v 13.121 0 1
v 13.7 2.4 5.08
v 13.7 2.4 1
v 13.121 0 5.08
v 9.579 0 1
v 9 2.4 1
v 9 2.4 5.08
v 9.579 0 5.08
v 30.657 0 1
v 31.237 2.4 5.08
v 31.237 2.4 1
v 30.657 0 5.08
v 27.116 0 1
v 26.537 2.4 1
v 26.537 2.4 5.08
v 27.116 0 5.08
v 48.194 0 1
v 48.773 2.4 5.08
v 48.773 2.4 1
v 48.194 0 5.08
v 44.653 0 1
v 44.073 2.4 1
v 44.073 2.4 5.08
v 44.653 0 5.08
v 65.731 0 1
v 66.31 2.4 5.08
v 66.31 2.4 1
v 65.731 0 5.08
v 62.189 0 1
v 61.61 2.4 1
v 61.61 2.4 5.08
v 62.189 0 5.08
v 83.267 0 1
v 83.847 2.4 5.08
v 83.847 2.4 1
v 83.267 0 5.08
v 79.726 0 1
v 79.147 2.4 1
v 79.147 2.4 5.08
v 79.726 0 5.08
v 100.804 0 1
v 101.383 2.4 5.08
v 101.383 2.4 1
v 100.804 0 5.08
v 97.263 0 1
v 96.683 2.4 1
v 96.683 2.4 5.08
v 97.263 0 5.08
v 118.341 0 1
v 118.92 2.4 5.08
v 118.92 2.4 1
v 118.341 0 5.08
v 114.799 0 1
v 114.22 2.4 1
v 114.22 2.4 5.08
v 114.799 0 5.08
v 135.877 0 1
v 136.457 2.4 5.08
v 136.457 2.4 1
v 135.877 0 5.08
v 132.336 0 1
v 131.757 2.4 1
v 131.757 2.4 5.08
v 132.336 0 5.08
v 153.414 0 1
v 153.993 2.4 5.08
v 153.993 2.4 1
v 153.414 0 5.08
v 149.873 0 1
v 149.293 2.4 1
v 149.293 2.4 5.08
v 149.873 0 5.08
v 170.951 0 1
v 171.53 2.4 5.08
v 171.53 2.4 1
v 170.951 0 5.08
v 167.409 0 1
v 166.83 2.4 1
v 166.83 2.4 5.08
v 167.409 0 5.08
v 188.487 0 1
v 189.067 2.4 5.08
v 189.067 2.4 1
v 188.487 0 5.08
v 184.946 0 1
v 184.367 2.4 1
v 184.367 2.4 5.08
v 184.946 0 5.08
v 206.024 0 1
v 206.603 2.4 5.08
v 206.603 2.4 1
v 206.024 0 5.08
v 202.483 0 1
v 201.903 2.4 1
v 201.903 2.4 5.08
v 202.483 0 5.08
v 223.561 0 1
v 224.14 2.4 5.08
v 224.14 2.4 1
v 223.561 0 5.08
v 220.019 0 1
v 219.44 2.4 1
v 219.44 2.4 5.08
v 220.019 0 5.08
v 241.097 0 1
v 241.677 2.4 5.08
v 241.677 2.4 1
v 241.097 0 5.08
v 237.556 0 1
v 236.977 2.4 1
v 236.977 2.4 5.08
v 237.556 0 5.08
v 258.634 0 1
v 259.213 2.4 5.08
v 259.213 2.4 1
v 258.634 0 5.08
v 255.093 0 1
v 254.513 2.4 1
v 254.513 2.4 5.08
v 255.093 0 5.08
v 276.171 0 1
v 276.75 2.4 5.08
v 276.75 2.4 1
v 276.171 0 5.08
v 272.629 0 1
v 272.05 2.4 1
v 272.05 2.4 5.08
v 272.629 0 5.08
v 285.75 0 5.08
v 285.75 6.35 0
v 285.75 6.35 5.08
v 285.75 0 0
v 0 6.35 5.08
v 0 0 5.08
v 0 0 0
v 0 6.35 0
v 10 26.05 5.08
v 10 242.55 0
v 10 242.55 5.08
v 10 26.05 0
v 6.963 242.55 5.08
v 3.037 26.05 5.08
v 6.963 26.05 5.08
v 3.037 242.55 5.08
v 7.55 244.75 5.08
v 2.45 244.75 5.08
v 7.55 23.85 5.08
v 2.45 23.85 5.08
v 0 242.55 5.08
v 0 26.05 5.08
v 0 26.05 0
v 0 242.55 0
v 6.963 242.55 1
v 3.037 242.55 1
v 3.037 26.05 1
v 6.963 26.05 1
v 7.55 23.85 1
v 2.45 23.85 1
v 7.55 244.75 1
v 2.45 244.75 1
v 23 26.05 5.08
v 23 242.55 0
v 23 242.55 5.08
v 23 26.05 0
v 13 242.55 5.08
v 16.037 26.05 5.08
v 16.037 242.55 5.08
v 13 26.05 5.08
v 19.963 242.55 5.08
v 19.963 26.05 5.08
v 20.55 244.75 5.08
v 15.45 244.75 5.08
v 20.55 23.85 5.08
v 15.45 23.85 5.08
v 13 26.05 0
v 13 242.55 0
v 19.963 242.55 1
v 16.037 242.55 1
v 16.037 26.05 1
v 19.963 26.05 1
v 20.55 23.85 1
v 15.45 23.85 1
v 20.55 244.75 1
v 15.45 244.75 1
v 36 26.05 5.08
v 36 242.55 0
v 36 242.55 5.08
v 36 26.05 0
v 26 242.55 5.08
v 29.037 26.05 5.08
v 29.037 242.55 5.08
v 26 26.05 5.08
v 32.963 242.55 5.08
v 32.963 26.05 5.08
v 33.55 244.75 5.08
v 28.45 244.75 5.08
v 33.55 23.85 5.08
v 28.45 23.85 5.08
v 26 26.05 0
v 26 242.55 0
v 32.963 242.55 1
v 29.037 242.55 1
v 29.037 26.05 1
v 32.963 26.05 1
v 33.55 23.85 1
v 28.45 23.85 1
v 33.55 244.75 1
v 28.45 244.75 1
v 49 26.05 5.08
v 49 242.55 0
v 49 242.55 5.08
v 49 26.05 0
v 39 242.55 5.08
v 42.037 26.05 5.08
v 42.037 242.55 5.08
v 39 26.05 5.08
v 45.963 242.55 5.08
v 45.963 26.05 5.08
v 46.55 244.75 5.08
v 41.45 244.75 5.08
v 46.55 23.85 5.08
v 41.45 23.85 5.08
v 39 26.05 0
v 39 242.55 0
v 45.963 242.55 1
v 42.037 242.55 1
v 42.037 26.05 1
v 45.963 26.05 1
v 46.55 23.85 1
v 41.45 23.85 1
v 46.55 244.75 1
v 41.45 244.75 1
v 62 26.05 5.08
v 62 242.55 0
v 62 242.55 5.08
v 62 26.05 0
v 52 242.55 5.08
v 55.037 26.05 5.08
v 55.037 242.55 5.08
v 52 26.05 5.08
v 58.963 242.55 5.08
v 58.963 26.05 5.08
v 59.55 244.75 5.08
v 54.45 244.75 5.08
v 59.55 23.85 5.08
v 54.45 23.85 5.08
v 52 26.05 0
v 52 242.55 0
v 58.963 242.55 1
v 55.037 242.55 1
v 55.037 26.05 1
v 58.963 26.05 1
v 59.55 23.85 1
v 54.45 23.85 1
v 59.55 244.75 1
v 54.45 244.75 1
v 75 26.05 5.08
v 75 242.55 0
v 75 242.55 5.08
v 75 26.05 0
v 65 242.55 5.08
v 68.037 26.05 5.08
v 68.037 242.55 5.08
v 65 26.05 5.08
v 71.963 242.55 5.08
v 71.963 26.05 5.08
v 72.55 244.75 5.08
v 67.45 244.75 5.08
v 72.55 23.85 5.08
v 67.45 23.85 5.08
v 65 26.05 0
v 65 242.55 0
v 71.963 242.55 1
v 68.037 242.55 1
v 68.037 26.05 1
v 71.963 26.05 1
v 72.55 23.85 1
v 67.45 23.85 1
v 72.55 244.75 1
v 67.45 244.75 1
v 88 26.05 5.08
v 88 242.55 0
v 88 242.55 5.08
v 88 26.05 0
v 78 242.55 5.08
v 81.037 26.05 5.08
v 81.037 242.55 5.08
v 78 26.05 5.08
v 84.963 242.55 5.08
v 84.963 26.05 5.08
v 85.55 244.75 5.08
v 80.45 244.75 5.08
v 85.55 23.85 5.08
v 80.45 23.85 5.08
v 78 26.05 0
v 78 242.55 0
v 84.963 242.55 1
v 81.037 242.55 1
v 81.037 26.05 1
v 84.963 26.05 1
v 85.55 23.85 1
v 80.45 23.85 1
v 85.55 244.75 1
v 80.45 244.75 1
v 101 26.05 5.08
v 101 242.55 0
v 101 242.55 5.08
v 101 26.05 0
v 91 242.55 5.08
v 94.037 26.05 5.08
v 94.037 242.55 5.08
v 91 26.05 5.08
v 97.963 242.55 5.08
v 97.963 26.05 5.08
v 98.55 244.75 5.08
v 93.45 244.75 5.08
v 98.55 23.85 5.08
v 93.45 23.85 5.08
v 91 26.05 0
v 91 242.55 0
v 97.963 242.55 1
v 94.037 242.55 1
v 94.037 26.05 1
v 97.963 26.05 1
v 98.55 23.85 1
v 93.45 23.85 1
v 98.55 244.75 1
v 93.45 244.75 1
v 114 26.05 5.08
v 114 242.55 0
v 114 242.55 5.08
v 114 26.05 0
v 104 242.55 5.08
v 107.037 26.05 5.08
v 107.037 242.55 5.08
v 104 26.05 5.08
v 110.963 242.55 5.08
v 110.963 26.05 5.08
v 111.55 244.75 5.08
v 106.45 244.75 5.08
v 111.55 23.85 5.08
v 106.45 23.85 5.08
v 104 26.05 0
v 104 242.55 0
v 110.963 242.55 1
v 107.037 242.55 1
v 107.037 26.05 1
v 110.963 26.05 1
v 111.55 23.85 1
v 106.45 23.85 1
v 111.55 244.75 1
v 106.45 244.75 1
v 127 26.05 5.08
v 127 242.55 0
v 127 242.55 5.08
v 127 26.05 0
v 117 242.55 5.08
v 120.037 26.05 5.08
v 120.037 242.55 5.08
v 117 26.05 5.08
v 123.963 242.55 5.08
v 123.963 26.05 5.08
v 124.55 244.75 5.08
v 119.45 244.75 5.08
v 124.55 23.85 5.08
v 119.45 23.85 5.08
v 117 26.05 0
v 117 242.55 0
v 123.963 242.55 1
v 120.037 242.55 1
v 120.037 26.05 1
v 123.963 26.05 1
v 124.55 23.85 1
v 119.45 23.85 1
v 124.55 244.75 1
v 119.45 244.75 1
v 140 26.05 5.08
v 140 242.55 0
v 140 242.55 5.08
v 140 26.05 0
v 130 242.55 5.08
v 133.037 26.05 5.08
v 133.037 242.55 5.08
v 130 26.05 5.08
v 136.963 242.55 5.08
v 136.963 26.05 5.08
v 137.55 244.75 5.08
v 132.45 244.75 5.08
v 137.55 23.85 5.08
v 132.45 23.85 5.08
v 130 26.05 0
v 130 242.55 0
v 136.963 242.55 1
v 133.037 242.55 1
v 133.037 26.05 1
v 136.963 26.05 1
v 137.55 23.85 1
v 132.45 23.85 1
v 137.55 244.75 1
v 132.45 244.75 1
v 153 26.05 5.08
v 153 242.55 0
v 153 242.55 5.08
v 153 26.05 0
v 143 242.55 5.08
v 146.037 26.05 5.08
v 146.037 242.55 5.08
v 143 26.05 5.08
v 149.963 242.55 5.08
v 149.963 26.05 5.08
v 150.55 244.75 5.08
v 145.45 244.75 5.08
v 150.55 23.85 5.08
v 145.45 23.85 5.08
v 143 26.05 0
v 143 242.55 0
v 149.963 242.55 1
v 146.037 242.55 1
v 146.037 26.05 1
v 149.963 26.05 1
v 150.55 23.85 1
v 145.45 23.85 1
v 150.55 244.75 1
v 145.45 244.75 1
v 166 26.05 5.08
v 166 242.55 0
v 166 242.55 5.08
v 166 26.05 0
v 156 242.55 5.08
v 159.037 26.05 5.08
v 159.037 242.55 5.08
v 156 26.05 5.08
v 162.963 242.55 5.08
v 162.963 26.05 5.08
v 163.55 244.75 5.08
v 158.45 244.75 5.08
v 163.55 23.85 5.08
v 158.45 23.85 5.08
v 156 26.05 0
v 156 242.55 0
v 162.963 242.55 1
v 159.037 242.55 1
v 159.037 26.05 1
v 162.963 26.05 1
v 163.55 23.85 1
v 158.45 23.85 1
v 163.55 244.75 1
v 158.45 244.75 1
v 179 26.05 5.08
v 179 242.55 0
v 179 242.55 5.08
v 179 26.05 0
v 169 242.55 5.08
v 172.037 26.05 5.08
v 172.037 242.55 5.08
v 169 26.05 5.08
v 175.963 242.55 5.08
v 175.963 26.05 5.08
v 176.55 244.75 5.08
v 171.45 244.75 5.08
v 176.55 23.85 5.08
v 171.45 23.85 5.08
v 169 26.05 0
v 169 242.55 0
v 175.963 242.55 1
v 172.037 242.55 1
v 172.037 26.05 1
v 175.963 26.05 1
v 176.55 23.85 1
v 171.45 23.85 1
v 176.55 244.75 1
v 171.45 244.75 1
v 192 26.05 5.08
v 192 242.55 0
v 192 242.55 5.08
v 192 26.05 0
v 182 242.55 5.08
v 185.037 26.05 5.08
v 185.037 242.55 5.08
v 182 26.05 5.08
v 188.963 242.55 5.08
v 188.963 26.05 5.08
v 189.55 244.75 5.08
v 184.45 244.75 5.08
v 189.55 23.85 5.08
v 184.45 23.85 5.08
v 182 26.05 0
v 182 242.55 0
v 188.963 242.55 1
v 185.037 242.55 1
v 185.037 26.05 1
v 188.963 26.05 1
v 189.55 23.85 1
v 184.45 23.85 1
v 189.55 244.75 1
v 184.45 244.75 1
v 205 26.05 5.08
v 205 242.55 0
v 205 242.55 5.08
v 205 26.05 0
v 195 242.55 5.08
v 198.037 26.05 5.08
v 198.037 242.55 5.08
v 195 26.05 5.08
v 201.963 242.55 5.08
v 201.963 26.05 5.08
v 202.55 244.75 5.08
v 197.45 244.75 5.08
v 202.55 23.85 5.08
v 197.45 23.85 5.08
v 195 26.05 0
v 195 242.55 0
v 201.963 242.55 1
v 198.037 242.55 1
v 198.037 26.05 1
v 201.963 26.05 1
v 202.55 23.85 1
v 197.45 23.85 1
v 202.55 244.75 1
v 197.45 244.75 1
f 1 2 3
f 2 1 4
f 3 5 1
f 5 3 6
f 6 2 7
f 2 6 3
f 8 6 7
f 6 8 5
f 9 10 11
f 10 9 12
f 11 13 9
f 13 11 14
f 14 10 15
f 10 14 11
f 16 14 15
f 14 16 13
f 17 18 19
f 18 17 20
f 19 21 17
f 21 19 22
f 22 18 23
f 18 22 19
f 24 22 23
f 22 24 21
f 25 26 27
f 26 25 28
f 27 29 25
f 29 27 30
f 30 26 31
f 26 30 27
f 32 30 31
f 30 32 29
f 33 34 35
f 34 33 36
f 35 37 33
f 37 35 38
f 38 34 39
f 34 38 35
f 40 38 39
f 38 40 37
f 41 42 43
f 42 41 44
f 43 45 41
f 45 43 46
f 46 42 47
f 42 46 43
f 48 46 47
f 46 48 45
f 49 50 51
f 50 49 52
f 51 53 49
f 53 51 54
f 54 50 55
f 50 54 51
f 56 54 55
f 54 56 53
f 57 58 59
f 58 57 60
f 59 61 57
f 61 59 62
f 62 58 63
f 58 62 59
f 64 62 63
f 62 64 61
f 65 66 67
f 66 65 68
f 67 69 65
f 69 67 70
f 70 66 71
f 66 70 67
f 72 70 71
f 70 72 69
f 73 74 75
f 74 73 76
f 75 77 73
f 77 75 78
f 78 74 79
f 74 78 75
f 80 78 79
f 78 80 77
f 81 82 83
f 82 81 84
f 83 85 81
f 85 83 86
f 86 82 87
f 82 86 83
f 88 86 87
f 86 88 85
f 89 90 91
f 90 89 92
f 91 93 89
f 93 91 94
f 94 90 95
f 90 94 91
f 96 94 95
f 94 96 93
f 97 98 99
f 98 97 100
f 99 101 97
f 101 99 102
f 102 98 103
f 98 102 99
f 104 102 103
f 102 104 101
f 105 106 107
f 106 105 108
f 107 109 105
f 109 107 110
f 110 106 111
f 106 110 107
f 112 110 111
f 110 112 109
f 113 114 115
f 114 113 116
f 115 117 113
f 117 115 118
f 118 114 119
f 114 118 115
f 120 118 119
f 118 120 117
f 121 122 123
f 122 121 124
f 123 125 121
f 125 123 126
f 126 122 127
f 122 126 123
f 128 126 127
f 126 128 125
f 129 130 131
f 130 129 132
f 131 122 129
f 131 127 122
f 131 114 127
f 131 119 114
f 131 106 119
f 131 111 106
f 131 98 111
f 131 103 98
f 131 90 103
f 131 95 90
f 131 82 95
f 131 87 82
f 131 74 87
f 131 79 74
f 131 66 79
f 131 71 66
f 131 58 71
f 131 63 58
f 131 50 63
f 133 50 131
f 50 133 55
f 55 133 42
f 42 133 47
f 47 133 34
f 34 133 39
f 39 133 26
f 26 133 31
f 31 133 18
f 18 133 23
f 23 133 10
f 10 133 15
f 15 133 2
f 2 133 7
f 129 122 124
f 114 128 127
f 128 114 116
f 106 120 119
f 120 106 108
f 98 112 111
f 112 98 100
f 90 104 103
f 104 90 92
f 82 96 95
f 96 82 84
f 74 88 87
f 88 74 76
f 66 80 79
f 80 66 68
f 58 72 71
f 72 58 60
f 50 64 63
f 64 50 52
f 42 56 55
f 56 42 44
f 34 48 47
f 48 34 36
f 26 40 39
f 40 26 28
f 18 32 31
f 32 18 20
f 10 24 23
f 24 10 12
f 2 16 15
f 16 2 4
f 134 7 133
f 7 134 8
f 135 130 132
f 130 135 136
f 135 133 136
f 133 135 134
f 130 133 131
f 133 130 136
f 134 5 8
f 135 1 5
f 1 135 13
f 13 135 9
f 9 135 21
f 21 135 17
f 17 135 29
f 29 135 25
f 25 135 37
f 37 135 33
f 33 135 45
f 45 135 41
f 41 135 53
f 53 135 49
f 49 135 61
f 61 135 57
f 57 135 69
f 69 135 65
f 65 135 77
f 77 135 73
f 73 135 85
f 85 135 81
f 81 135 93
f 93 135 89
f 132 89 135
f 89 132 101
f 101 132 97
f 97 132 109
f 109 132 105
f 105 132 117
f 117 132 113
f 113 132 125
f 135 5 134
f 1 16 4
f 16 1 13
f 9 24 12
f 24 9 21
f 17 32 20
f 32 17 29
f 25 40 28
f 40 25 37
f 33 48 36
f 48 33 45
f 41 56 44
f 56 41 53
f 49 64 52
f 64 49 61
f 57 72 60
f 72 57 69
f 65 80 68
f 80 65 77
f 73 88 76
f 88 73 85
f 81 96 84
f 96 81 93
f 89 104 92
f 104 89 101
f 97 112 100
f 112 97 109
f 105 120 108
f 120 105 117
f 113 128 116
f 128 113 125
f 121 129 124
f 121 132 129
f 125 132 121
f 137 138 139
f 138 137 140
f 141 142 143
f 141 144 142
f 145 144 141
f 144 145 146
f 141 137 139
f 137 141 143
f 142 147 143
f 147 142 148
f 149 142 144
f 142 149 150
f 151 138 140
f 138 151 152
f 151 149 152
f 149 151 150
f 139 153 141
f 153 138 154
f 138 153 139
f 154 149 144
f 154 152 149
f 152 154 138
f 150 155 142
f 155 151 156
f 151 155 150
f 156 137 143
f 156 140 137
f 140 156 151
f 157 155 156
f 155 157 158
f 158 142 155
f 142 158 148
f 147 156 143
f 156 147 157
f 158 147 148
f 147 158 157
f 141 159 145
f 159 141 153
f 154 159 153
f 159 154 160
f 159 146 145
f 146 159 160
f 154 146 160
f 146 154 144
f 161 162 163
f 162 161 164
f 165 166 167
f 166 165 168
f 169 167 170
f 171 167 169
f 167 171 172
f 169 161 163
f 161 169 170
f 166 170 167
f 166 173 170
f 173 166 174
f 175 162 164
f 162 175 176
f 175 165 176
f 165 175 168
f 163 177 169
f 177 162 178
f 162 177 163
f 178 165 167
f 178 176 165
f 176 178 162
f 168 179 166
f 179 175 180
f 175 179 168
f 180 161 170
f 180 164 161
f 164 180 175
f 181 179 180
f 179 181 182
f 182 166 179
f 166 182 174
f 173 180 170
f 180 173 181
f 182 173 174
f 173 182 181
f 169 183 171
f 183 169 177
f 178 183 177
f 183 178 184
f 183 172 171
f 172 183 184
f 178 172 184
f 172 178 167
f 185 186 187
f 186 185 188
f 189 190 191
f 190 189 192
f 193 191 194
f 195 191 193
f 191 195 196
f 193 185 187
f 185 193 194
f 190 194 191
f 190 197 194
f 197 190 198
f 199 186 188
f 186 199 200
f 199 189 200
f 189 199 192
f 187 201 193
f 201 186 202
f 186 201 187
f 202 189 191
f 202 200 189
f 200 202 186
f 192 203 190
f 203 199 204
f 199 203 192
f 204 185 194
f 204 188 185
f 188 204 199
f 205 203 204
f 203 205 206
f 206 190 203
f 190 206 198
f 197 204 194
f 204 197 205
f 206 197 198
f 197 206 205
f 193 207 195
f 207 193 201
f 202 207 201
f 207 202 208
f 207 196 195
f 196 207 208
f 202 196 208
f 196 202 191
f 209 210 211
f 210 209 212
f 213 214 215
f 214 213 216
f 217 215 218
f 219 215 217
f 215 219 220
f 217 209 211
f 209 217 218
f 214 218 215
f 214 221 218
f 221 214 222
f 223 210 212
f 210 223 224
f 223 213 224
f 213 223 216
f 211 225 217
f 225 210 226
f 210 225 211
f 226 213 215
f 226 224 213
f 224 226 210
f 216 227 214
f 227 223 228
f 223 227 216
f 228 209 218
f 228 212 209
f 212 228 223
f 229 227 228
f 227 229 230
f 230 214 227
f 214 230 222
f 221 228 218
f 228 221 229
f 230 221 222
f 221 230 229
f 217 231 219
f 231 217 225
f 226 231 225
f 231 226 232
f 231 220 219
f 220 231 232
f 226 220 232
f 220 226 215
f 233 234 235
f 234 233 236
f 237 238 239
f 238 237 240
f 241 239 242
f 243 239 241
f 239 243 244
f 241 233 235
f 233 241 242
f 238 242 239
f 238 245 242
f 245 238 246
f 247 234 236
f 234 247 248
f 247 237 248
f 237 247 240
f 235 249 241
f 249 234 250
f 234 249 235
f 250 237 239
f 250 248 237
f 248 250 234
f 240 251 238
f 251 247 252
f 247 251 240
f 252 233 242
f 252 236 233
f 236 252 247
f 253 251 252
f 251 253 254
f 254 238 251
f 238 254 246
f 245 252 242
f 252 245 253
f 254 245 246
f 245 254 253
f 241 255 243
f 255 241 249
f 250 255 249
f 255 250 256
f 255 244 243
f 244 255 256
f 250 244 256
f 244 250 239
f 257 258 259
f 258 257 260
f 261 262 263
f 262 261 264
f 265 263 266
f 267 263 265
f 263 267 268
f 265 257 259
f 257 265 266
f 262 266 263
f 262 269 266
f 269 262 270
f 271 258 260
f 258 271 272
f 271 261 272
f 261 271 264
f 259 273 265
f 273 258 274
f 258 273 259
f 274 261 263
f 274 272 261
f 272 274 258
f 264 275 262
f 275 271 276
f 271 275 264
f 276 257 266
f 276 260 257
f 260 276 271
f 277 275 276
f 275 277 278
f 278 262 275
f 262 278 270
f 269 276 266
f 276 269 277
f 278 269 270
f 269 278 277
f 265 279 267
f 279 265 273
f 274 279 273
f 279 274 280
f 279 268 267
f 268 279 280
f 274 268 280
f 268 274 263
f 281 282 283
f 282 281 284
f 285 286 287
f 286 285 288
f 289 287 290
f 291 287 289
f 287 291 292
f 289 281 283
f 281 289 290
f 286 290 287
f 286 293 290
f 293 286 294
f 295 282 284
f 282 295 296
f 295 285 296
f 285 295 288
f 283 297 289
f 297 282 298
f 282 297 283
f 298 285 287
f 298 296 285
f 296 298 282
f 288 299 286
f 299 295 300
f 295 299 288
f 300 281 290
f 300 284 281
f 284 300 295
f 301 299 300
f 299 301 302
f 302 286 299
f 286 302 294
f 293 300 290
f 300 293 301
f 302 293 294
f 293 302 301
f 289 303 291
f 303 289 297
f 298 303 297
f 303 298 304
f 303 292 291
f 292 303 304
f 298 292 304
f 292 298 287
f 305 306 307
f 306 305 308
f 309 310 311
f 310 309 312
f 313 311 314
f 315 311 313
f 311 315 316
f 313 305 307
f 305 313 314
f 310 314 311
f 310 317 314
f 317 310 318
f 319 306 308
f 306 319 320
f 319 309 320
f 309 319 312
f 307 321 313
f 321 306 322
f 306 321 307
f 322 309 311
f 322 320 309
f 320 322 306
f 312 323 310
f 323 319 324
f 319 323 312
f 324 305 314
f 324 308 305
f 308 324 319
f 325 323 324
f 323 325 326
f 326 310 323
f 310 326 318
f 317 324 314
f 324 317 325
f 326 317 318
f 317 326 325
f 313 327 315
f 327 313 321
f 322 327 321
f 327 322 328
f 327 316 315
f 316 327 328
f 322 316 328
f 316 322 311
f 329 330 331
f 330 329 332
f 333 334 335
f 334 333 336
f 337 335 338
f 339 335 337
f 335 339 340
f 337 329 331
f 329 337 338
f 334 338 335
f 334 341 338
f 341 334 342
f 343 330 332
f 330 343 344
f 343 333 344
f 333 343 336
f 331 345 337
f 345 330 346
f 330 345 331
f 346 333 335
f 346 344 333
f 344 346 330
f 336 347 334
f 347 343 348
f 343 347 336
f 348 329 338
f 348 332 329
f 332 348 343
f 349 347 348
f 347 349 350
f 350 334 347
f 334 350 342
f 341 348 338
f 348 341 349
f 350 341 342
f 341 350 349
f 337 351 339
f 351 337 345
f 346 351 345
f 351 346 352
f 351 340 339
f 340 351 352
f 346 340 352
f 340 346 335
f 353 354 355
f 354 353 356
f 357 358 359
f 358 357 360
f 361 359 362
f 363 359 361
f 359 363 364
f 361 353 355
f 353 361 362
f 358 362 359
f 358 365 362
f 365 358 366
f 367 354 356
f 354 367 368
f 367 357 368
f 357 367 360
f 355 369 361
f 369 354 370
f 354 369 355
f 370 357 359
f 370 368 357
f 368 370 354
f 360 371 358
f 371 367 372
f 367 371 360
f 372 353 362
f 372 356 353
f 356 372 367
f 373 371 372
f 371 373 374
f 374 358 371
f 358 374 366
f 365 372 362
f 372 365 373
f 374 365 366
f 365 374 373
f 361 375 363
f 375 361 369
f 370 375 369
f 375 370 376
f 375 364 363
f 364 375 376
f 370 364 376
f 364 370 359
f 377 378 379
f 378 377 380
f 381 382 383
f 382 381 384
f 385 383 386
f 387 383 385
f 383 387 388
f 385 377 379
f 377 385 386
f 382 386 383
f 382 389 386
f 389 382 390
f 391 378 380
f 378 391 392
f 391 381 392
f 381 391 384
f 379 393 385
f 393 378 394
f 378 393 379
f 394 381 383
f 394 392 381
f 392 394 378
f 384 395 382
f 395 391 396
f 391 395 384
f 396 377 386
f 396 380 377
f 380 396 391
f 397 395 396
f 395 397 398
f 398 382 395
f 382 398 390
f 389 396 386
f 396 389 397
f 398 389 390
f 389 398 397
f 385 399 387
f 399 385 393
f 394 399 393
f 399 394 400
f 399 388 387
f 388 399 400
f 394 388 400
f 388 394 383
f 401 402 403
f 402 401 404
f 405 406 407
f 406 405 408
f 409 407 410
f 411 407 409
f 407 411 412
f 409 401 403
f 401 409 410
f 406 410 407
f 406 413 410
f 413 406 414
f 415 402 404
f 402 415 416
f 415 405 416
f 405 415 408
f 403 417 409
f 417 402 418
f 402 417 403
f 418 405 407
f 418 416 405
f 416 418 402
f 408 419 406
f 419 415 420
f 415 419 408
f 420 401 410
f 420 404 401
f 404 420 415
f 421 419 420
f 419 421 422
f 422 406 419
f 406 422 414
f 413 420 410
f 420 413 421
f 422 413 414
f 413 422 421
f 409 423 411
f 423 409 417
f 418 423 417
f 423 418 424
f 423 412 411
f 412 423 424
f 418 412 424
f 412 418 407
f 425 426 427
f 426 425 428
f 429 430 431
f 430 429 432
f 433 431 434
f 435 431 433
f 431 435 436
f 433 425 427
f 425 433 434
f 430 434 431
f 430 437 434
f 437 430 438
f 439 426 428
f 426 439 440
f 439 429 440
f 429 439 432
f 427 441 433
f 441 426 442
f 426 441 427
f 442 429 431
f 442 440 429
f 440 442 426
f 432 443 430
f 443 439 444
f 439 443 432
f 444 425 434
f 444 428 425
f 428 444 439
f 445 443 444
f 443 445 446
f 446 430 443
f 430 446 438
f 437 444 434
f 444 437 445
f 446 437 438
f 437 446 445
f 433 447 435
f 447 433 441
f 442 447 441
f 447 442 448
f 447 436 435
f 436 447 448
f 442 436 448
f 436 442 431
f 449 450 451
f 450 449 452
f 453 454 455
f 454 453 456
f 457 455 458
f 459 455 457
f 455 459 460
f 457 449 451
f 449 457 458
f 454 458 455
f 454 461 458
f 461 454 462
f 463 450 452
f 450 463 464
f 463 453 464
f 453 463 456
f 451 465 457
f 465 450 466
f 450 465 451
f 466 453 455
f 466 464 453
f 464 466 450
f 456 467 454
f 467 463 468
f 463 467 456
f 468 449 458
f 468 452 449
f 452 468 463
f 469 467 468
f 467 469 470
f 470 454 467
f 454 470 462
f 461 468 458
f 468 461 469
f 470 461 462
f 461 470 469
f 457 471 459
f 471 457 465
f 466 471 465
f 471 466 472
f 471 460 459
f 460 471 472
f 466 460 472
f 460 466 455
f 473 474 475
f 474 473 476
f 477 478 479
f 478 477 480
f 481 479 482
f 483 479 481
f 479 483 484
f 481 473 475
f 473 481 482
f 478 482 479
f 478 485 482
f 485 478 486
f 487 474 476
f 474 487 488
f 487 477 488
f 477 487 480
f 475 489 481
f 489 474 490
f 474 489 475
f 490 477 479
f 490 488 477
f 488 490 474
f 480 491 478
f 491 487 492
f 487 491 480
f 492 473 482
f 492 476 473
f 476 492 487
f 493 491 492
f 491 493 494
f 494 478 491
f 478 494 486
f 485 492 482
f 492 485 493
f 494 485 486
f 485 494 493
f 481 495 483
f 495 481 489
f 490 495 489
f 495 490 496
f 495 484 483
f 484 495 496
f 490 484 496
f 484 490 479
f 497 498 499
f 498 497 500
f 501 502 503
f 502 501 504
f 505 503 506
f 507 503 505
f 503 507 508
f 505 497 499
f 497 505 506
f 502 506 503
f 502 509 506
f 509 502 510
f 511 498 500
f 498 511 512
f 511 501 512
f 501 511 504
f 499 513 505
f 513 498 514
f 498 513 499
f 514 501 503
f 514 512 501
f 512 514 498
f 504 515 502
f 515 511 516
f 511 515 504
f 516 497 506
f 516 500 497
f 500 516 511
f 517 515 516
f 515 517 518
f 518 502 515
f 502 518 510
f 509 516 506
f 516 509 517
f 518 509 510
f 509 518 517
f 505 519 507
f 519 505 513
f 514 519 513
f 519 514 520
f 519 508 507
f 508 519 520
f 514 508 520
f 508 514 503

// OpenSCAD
// file: model-forge/model-forge/joint.scad
// model-forge/joint.scad — dovetail finger-joint tabs for snap-fit panel
// segmentation. One segment gets protruding tabs (union onto its edge),
// the matching segment gets slightly-larger slots (difference cut into
// its edge) so the two press together with a light interference/snap fit.
//
// Both modules produce a 2D profile running along the X axis, centered
// on the boundary line (y=0), for a boundary of the given edge_length.
// The caller extrudes and positions/rotates it onto the actual seam
// (see back-wall-joint-test.scad for a worked example on a vertical seam).
//
//   use <model-forge/joint.scad>
//   linear_extrude(height=thickness)
//     dovetail_tabs_2d(edge_length=60, tab_width=15, tab_depth=6, taper=2);
//   // on the MATING piece, subtract:
//   linear_extrude(height=thickness+2)
//     dovetail_tabs_2d(edge_length=60, tab_width=15, tab_depth=6, taper=2, clearance=0.15);

module dovetail_tab_2d(tab_width, tab_depth, taper, base_overlap = 0.5) {
  // Trapezoid: narrow at the base, wider at the tip (y=tab_depth) — the
  // taper is what makes it a dovetail (can't pull straight out sideways
  // once the mating slot is filled) and gives the snap/interference feel
  // as it's pressed in along Y. The base extends base_overlap PAST y=0
  // (the seam line) on purpose: a cut/union placed exactly flush with a
  // piece's boundary face (zero overlap) is a classic OpenSCAD/CGAL
  // gotcha — coincident faces produce degenerate, non-manifold results
  // (confirmed here: without the overlap this rendered as a distorted
  // sliver instead of a clean notch). The overlap guarantees real overlap
  // for both the union (tab) and difference (slot) uses.
  polygon(points = [
    [-tab_width / 2, -base_overlap],
    [tab_width / 2, -base_overlap],
    [tab_width / 2 + taper, tab_depth],
    [-tab_width / 2 - taper, tab_depth],
  ]);
}

/**
 * A row of dovetail tabs spanning edge_length, evenly spaced and centered,
 * each tab_width wide with tab_depth of protrusion and the given taper.
 * Pass clearance > 0 (e.g. 0.15-0.2mm) when using this as a SLOT cutout on
 * the mating piece, so the tab has just enough room to press in.
 */
module dovetail_tabs_2d(edge_length, tab_width, tab_depth, taper, clearance = 0) {
  // Growing the slot via offset(delta=clearance) produced a disconnected
  // sliver fragment at the corner (confirmed with --render: 3 volumes
  // instead of 2, a known OpenSCAD quirk with delta-mode offset on a
  // trapezoid). Scaling the tab's own dimensions directly instead avoids
  // offset() entirely and renders as the expected 2 volumes.
  pitch = tab_width * 2;
  n = max(1, floor(edge_length / pitch));
  row_width = n * pitch - tab_width;
  start_x = -row_width / 2;
  for (i = [0 : n - 1]) {
    translate([start_x + i * pitch, 0])
      dovetail_tab_2d(tab_width + 2 * clearance, tab_depth + clearance, taper + clearance);
  }
}
// file: model-forge/rack.scad
// model-forge/rack.scad — oven-rack-style construction: individual bars
// that dovetail into mortise slots on a rail, instead of one molded
// panel. Replaces the "cut a monolithic grate in half" approach: that
// either avoids the bars entirely (leaving only 2 tiny joints holding
// the whole panel together — a weak load path) or requires a shallow
// in-plane tab carved into a thin panel edge (limited by the panel's
// own thin cross-section). A real oven rack is built this way for a
// reason: each bar's FULL cross-section becomes the tenon, engaging the
// rail through its whole thickness — much stronger than a shallow edge
// tab, and the load is distributed across every bar instead of 2 points.
//
// Tenon defaults are the validated small-scale dovetail from
// dovetail-fit-test-small.scad (tab_width=3.5, tab_depth=2.5, taper=0.8)
// at clearance=-0.1mm — the winning value from a real print test
// (-0.15 held but needed a mallet and risked overstressing the joint;
// -0.1 was solid without excessive force).
use <model-forge/joint.scad> // dovetail_tab_2d

DEFAULT_TENON_WIDTH = 3.5;
DEFAULT_TENON_DEPTH = 2.5;
DEFAULT_TENON_TAPER = 0.8;
DEFAULT_CLEARANCE   = -0.1;
// A blind pocket instead of a through-slot: leaves this much solid
// material at the BOTTOM of the mortise (z=0 to floor_thickness) so a
// bar's tenon has a real seat to rest against instead of being able to
// slide all the way through with no positive stop. User: "the middle
// can actually have a small base layer under the rail so that the edge
// rails can hold the dovetail piece without allowing it to fall
// through -- even a 1mm... would work well." Set to 0 for the old
// through-slot behavior.
DEFAULT_FLOOR_THICKNESS = 1;

// A single bar spanning `span`, with a tenon on each end (at y=0,
// pointing further -Y, and at y=span, pointing further +Y). The tenon
// itself is shortened to (thickness - floor_thickness) and lifted to
// start at z=floor_thickness, so its bottom face lands exactly on the
// rail's mortise floor instead of continuing past it.
//
// eps: the bar's own base cube overlaps span by eps on each end so it
// genuinely penetrates into the rail's solid volume, not just touches
// it flush. dovetail_tab_2d's own base_overlap already handles this for
// the tenon itself, but the FLAT part of the bar's end face (the width
// outside the tenon) was still landing exactly coincident with the
// rail's flat face -- confirmed via a non-manifold-edge check (trimesh
// found them at exactly y=rail_width and y=rail_width+span, everywhere
// except the tenon). Same class of bug as tray.scad's lip eps and
// joint.scad's tab base_overlap.
module rack_bar(
  span,
  bar_width,
  thickness,
  tenon_width     = DEFAULT_TENON_WIDTH,
  tenon_depth     = DEFAULT_TENON_DEPTH,
  tenon_taper     = DEFAULT_TENON_TAPER,
  floor_thickness = DEFAULT_FLOOR_THICKNESS
) {
  eps = 0.3;
  tenon_h = thickness - floor_thickness;
  union() {
    translate([0, -eps, 0])
      cube([bar_width, span + 2 * eps, thickness]);
    translate([bar_width / 2, 0, floor_thickness])
      rotate([0, 0, 180])
        linear_extrude(height = tenon_h)
          dovetail_tab_2d(tenon_width, tenon_depth, tenon_taper);
    translate([bar_width / 2, span, floor_thickness])
      linear_extrude(height = tenon_h)
        dovetail_tab_2d(tenon_width, tenon_depth, tenon_taper);
  }
}

// A straight rail with n_bars evenly-spaced mortise slots along its
// y=0 edge, cutting +Y into rail_width. Each slot is a blind pocket
// (see floor_thickness above), not a through-cut. Mirror this piece
// (mirror([0,1,0]) then translate) to use it as the opposite-facing
// rail in an assembly — the slot pattern is symmetric, only the facing
// direction changes.
module rack_rail(
  length,
  rail_width,
  thickness,
  n_bars,
  bar_pitch,
  first_offset,
  tenon_width     = DEFAULT_TENON_WIDTH,
  tenon_depth     = DEFAULT_TENON_DEPTH,
  tenon_taper     = DEFAULT_TENON_TAPER,
  clearance       = DEFAULT_CLEARANCE,
  floor_thickness = DEFAULT_FLOOR_THICKNESS
) {
  difference() {
    cube([length, rail_width, thickness]);
    for (i = [0 : n_bars - 1])
      translate([first_offset + i * bar_pitch, 0, floor_thickness])
        linear_extrude(height = thickness - floor_thickness + 1)
          dovetail_tab_2d(
            tenon_width + 2 * clearance,
            tenon_depth + clearance,
            tenon_taper + clearance
          );
  }
}

// 2D wing profile: flat on the LEFT edge (x=0, where it joins a bar's
// own body), rounded on the RIGHT edge (the outer, x=width side).
// Built as a hull of two near-zero-radius points pinning the flat left
// edge and two real-radius circles rounding the right edge — same
// hull-of-circles technique as tray.scad's rounded_rect_2d.
//
// fillet_r must stay <= width/2, or the fillet circles (centered at
// width-fillet_r) bulge past x=0 and the "flat" edge disappears —
// confirmed: fillet_r=5 on width=6.35 put the circle center only
// 1.35mm from the edge with a 5mm radius, extending to x=-3.65 instead
// of stopping at x=0.
module edge_wing_2d(width, height, fillet_r) {
  hull() {
    translate([0, 0]) circle(r = 0.01, $fn = 8);
    translate([0, height]) circle(r = 0.01, $fn = 8);
    translate([width - fillet_r, fillet_r]) circle(r = fillet_r, $fn = 32);
    translate([width - fillet_r, height - fillet_r]) circle(r = fillet_r, $fn = 32);
  }
}

// An edge bar: identical tenon mechanism to rack_bar (dovetails into
// the SAME rail mortises, at the SAME pitch position as any other bar)
// but wider — extended out to the frame's true outer edge with a
// rounded outer corner, plus the lip flange for docking into the oven
// cavity's support rail. Replaces a separate perpendicular side-rail
// piece entirely: "why are you separating the side ones from the rail
// next to it -- we have 14 normal rails and 2 side rails with a nice
// rounded taper." No new joint type — same dovetail-into-mortise
// mechanism as every other bar, just a wider body on the outer end.
//
// wing_width: how far the wing extends beyond the bar's own bar_width
// (normally = frame_width_mm, reaching exactly to the true frame edge).
// Mirror this module (mirror([1,0,0]) after translating to the bar's
// own local origin) to build the RIGHT-side edge bar from the same code.
module rack_edge_bar(
  span,
  bar_width,
  thickness,
  wing_width,
  fillet_r,
  lip_width       = 0,
  lip_thickness   = 0,
  tenon_width     = DEFAULT_TENON_WIDTH,
  tenon_depth     = DEFAULT_TENON_DEPTH,
  tenon_taper     = DEFAULT_TENON_TAPER,
  floor_thickness = DEFAULT_FLOOR_THICKNESS
) {
  eps = 0.3; // same coincident-face overlap as rack_bar's own base cube
  union() {
    rack_bar(span, bar_width, thickness, tenon_width, tenon_depth, tenon_taper, floor_thickness);
    // Wing overlaps eps into the bar's own core (positive x) instead of
    // stopping exactly flush at x=0 -- same class of bug as the
    // bar/rail coincident face fixed earlier.
    //
    // Bug fixed 2026-09-13: mirroring the 2D profile BEFORE
    // linear_extrude (mirror([1,0]) on edge_wing_2d itself) inverts the
    // polygon winding -- the resulting solid was watertight on its own
    // but with is_winding_consistent=False and NEGATIVE volume. Unioned
    // with the bar's normal-winding solid, this silently produced a
    // mesh missing the wing entirely (confirmed: OpenSCAD's own "mesh
    // is not closed" warning, and the exported STL had no wing
    // geometry at all). Fix: mirror the 3D solid AFTER extrusion
    // instead, which OpenSCAD's dedicated 3D mirror handles correctly.
    translate([eps, 0, 0])
      mirror([1, 0, 0])
        linear_extrude(height = thickness)
          edge_wing_2d(wing_width, span, fillet_r);
    if (lip_width > 0 && lip_thickness > 0)
      translate([-wing_width - lip_width + eps, 0, thickness - lip_thickness])
        cube([lip_width, span, lip_thickness]);
  }
}
// main file
// Tiny Land oven grate v2 — full-scale rack construction: 16 real bars
// dovetailing into a top rail and a bottom rail, at the validated
// -0.1mm clearance. Same numbers as the original oven_grate()'s
// auto-fit bar pattern (16 bars, 10mm wide, 7.537mm gaps) so this sits
// in the exact same footprint.
//
// The rails (285.75mm) still exceed the 256mm bed by ~30mm -- that
// splice is meant to be done with Bambu Studio's own sliding Dovetail
// cut mode (the tool and orientation already validated and preferred),
// not hand-rolled here. Import rail.stl, use the Cut tool on it.
//
// The 16 bars (215.9mm each) all fit the bed individually and are laid
// out here as one printable plate.
use <model-forge/rack.scad>

/* [Size — inches, matches oven-grate.scad] */
outer_width_in  = 11.25;
outer_height_in = 9;

/* [Bars] */
frame_width_mm = 6.35;
bar_width_mm   = 10;
n_bars         = 16;

IN_TO_MM = 25.4;
outer_w = outer_width_in * IN_TO_MM;
outer_h = outer_height_in * IN_TO_MM;
thickness = 5.08;

inner_w = outer_w - 2 * frame_width_mm;
inner_h = outer_h - 2 * frame_width_mm;
actual_gap = (inner_w - n_bars * bar_width_mm) / (n_bars - 1);
bar_pitch = bar_width_mm + actual_gap;
first_offset = frame_width_mm + bar_width_mm / 2;

// One rail — 16 slots, 285.75mm long (exceeds the bed; splice via
// Bambu Studio's sliding Dovetail cut, not here). Same rail design
// works as both top and bottom (mirror it for the opposite-facing
// slots — see rack.scad).
module grate_rail() {
  rack_rail(outer_w, frame_width_mm, thickness, n_bars, bar_pitch, first_offset);
}

// One bar — 215.9mm, fits the bed on its own.
module grate_bar() {
  rack_bar(inner_h, bar_width_mm, thickness);
}

grate_rail();

// All 16 bars, tiled on one plate below the rail.
bar_gap = 3;
for (i = [0 : n_bars - 1])
  translate([i * (bar_width_mm + bar_gap), frame_width_mm + 20, 0])
    grate_bar();
